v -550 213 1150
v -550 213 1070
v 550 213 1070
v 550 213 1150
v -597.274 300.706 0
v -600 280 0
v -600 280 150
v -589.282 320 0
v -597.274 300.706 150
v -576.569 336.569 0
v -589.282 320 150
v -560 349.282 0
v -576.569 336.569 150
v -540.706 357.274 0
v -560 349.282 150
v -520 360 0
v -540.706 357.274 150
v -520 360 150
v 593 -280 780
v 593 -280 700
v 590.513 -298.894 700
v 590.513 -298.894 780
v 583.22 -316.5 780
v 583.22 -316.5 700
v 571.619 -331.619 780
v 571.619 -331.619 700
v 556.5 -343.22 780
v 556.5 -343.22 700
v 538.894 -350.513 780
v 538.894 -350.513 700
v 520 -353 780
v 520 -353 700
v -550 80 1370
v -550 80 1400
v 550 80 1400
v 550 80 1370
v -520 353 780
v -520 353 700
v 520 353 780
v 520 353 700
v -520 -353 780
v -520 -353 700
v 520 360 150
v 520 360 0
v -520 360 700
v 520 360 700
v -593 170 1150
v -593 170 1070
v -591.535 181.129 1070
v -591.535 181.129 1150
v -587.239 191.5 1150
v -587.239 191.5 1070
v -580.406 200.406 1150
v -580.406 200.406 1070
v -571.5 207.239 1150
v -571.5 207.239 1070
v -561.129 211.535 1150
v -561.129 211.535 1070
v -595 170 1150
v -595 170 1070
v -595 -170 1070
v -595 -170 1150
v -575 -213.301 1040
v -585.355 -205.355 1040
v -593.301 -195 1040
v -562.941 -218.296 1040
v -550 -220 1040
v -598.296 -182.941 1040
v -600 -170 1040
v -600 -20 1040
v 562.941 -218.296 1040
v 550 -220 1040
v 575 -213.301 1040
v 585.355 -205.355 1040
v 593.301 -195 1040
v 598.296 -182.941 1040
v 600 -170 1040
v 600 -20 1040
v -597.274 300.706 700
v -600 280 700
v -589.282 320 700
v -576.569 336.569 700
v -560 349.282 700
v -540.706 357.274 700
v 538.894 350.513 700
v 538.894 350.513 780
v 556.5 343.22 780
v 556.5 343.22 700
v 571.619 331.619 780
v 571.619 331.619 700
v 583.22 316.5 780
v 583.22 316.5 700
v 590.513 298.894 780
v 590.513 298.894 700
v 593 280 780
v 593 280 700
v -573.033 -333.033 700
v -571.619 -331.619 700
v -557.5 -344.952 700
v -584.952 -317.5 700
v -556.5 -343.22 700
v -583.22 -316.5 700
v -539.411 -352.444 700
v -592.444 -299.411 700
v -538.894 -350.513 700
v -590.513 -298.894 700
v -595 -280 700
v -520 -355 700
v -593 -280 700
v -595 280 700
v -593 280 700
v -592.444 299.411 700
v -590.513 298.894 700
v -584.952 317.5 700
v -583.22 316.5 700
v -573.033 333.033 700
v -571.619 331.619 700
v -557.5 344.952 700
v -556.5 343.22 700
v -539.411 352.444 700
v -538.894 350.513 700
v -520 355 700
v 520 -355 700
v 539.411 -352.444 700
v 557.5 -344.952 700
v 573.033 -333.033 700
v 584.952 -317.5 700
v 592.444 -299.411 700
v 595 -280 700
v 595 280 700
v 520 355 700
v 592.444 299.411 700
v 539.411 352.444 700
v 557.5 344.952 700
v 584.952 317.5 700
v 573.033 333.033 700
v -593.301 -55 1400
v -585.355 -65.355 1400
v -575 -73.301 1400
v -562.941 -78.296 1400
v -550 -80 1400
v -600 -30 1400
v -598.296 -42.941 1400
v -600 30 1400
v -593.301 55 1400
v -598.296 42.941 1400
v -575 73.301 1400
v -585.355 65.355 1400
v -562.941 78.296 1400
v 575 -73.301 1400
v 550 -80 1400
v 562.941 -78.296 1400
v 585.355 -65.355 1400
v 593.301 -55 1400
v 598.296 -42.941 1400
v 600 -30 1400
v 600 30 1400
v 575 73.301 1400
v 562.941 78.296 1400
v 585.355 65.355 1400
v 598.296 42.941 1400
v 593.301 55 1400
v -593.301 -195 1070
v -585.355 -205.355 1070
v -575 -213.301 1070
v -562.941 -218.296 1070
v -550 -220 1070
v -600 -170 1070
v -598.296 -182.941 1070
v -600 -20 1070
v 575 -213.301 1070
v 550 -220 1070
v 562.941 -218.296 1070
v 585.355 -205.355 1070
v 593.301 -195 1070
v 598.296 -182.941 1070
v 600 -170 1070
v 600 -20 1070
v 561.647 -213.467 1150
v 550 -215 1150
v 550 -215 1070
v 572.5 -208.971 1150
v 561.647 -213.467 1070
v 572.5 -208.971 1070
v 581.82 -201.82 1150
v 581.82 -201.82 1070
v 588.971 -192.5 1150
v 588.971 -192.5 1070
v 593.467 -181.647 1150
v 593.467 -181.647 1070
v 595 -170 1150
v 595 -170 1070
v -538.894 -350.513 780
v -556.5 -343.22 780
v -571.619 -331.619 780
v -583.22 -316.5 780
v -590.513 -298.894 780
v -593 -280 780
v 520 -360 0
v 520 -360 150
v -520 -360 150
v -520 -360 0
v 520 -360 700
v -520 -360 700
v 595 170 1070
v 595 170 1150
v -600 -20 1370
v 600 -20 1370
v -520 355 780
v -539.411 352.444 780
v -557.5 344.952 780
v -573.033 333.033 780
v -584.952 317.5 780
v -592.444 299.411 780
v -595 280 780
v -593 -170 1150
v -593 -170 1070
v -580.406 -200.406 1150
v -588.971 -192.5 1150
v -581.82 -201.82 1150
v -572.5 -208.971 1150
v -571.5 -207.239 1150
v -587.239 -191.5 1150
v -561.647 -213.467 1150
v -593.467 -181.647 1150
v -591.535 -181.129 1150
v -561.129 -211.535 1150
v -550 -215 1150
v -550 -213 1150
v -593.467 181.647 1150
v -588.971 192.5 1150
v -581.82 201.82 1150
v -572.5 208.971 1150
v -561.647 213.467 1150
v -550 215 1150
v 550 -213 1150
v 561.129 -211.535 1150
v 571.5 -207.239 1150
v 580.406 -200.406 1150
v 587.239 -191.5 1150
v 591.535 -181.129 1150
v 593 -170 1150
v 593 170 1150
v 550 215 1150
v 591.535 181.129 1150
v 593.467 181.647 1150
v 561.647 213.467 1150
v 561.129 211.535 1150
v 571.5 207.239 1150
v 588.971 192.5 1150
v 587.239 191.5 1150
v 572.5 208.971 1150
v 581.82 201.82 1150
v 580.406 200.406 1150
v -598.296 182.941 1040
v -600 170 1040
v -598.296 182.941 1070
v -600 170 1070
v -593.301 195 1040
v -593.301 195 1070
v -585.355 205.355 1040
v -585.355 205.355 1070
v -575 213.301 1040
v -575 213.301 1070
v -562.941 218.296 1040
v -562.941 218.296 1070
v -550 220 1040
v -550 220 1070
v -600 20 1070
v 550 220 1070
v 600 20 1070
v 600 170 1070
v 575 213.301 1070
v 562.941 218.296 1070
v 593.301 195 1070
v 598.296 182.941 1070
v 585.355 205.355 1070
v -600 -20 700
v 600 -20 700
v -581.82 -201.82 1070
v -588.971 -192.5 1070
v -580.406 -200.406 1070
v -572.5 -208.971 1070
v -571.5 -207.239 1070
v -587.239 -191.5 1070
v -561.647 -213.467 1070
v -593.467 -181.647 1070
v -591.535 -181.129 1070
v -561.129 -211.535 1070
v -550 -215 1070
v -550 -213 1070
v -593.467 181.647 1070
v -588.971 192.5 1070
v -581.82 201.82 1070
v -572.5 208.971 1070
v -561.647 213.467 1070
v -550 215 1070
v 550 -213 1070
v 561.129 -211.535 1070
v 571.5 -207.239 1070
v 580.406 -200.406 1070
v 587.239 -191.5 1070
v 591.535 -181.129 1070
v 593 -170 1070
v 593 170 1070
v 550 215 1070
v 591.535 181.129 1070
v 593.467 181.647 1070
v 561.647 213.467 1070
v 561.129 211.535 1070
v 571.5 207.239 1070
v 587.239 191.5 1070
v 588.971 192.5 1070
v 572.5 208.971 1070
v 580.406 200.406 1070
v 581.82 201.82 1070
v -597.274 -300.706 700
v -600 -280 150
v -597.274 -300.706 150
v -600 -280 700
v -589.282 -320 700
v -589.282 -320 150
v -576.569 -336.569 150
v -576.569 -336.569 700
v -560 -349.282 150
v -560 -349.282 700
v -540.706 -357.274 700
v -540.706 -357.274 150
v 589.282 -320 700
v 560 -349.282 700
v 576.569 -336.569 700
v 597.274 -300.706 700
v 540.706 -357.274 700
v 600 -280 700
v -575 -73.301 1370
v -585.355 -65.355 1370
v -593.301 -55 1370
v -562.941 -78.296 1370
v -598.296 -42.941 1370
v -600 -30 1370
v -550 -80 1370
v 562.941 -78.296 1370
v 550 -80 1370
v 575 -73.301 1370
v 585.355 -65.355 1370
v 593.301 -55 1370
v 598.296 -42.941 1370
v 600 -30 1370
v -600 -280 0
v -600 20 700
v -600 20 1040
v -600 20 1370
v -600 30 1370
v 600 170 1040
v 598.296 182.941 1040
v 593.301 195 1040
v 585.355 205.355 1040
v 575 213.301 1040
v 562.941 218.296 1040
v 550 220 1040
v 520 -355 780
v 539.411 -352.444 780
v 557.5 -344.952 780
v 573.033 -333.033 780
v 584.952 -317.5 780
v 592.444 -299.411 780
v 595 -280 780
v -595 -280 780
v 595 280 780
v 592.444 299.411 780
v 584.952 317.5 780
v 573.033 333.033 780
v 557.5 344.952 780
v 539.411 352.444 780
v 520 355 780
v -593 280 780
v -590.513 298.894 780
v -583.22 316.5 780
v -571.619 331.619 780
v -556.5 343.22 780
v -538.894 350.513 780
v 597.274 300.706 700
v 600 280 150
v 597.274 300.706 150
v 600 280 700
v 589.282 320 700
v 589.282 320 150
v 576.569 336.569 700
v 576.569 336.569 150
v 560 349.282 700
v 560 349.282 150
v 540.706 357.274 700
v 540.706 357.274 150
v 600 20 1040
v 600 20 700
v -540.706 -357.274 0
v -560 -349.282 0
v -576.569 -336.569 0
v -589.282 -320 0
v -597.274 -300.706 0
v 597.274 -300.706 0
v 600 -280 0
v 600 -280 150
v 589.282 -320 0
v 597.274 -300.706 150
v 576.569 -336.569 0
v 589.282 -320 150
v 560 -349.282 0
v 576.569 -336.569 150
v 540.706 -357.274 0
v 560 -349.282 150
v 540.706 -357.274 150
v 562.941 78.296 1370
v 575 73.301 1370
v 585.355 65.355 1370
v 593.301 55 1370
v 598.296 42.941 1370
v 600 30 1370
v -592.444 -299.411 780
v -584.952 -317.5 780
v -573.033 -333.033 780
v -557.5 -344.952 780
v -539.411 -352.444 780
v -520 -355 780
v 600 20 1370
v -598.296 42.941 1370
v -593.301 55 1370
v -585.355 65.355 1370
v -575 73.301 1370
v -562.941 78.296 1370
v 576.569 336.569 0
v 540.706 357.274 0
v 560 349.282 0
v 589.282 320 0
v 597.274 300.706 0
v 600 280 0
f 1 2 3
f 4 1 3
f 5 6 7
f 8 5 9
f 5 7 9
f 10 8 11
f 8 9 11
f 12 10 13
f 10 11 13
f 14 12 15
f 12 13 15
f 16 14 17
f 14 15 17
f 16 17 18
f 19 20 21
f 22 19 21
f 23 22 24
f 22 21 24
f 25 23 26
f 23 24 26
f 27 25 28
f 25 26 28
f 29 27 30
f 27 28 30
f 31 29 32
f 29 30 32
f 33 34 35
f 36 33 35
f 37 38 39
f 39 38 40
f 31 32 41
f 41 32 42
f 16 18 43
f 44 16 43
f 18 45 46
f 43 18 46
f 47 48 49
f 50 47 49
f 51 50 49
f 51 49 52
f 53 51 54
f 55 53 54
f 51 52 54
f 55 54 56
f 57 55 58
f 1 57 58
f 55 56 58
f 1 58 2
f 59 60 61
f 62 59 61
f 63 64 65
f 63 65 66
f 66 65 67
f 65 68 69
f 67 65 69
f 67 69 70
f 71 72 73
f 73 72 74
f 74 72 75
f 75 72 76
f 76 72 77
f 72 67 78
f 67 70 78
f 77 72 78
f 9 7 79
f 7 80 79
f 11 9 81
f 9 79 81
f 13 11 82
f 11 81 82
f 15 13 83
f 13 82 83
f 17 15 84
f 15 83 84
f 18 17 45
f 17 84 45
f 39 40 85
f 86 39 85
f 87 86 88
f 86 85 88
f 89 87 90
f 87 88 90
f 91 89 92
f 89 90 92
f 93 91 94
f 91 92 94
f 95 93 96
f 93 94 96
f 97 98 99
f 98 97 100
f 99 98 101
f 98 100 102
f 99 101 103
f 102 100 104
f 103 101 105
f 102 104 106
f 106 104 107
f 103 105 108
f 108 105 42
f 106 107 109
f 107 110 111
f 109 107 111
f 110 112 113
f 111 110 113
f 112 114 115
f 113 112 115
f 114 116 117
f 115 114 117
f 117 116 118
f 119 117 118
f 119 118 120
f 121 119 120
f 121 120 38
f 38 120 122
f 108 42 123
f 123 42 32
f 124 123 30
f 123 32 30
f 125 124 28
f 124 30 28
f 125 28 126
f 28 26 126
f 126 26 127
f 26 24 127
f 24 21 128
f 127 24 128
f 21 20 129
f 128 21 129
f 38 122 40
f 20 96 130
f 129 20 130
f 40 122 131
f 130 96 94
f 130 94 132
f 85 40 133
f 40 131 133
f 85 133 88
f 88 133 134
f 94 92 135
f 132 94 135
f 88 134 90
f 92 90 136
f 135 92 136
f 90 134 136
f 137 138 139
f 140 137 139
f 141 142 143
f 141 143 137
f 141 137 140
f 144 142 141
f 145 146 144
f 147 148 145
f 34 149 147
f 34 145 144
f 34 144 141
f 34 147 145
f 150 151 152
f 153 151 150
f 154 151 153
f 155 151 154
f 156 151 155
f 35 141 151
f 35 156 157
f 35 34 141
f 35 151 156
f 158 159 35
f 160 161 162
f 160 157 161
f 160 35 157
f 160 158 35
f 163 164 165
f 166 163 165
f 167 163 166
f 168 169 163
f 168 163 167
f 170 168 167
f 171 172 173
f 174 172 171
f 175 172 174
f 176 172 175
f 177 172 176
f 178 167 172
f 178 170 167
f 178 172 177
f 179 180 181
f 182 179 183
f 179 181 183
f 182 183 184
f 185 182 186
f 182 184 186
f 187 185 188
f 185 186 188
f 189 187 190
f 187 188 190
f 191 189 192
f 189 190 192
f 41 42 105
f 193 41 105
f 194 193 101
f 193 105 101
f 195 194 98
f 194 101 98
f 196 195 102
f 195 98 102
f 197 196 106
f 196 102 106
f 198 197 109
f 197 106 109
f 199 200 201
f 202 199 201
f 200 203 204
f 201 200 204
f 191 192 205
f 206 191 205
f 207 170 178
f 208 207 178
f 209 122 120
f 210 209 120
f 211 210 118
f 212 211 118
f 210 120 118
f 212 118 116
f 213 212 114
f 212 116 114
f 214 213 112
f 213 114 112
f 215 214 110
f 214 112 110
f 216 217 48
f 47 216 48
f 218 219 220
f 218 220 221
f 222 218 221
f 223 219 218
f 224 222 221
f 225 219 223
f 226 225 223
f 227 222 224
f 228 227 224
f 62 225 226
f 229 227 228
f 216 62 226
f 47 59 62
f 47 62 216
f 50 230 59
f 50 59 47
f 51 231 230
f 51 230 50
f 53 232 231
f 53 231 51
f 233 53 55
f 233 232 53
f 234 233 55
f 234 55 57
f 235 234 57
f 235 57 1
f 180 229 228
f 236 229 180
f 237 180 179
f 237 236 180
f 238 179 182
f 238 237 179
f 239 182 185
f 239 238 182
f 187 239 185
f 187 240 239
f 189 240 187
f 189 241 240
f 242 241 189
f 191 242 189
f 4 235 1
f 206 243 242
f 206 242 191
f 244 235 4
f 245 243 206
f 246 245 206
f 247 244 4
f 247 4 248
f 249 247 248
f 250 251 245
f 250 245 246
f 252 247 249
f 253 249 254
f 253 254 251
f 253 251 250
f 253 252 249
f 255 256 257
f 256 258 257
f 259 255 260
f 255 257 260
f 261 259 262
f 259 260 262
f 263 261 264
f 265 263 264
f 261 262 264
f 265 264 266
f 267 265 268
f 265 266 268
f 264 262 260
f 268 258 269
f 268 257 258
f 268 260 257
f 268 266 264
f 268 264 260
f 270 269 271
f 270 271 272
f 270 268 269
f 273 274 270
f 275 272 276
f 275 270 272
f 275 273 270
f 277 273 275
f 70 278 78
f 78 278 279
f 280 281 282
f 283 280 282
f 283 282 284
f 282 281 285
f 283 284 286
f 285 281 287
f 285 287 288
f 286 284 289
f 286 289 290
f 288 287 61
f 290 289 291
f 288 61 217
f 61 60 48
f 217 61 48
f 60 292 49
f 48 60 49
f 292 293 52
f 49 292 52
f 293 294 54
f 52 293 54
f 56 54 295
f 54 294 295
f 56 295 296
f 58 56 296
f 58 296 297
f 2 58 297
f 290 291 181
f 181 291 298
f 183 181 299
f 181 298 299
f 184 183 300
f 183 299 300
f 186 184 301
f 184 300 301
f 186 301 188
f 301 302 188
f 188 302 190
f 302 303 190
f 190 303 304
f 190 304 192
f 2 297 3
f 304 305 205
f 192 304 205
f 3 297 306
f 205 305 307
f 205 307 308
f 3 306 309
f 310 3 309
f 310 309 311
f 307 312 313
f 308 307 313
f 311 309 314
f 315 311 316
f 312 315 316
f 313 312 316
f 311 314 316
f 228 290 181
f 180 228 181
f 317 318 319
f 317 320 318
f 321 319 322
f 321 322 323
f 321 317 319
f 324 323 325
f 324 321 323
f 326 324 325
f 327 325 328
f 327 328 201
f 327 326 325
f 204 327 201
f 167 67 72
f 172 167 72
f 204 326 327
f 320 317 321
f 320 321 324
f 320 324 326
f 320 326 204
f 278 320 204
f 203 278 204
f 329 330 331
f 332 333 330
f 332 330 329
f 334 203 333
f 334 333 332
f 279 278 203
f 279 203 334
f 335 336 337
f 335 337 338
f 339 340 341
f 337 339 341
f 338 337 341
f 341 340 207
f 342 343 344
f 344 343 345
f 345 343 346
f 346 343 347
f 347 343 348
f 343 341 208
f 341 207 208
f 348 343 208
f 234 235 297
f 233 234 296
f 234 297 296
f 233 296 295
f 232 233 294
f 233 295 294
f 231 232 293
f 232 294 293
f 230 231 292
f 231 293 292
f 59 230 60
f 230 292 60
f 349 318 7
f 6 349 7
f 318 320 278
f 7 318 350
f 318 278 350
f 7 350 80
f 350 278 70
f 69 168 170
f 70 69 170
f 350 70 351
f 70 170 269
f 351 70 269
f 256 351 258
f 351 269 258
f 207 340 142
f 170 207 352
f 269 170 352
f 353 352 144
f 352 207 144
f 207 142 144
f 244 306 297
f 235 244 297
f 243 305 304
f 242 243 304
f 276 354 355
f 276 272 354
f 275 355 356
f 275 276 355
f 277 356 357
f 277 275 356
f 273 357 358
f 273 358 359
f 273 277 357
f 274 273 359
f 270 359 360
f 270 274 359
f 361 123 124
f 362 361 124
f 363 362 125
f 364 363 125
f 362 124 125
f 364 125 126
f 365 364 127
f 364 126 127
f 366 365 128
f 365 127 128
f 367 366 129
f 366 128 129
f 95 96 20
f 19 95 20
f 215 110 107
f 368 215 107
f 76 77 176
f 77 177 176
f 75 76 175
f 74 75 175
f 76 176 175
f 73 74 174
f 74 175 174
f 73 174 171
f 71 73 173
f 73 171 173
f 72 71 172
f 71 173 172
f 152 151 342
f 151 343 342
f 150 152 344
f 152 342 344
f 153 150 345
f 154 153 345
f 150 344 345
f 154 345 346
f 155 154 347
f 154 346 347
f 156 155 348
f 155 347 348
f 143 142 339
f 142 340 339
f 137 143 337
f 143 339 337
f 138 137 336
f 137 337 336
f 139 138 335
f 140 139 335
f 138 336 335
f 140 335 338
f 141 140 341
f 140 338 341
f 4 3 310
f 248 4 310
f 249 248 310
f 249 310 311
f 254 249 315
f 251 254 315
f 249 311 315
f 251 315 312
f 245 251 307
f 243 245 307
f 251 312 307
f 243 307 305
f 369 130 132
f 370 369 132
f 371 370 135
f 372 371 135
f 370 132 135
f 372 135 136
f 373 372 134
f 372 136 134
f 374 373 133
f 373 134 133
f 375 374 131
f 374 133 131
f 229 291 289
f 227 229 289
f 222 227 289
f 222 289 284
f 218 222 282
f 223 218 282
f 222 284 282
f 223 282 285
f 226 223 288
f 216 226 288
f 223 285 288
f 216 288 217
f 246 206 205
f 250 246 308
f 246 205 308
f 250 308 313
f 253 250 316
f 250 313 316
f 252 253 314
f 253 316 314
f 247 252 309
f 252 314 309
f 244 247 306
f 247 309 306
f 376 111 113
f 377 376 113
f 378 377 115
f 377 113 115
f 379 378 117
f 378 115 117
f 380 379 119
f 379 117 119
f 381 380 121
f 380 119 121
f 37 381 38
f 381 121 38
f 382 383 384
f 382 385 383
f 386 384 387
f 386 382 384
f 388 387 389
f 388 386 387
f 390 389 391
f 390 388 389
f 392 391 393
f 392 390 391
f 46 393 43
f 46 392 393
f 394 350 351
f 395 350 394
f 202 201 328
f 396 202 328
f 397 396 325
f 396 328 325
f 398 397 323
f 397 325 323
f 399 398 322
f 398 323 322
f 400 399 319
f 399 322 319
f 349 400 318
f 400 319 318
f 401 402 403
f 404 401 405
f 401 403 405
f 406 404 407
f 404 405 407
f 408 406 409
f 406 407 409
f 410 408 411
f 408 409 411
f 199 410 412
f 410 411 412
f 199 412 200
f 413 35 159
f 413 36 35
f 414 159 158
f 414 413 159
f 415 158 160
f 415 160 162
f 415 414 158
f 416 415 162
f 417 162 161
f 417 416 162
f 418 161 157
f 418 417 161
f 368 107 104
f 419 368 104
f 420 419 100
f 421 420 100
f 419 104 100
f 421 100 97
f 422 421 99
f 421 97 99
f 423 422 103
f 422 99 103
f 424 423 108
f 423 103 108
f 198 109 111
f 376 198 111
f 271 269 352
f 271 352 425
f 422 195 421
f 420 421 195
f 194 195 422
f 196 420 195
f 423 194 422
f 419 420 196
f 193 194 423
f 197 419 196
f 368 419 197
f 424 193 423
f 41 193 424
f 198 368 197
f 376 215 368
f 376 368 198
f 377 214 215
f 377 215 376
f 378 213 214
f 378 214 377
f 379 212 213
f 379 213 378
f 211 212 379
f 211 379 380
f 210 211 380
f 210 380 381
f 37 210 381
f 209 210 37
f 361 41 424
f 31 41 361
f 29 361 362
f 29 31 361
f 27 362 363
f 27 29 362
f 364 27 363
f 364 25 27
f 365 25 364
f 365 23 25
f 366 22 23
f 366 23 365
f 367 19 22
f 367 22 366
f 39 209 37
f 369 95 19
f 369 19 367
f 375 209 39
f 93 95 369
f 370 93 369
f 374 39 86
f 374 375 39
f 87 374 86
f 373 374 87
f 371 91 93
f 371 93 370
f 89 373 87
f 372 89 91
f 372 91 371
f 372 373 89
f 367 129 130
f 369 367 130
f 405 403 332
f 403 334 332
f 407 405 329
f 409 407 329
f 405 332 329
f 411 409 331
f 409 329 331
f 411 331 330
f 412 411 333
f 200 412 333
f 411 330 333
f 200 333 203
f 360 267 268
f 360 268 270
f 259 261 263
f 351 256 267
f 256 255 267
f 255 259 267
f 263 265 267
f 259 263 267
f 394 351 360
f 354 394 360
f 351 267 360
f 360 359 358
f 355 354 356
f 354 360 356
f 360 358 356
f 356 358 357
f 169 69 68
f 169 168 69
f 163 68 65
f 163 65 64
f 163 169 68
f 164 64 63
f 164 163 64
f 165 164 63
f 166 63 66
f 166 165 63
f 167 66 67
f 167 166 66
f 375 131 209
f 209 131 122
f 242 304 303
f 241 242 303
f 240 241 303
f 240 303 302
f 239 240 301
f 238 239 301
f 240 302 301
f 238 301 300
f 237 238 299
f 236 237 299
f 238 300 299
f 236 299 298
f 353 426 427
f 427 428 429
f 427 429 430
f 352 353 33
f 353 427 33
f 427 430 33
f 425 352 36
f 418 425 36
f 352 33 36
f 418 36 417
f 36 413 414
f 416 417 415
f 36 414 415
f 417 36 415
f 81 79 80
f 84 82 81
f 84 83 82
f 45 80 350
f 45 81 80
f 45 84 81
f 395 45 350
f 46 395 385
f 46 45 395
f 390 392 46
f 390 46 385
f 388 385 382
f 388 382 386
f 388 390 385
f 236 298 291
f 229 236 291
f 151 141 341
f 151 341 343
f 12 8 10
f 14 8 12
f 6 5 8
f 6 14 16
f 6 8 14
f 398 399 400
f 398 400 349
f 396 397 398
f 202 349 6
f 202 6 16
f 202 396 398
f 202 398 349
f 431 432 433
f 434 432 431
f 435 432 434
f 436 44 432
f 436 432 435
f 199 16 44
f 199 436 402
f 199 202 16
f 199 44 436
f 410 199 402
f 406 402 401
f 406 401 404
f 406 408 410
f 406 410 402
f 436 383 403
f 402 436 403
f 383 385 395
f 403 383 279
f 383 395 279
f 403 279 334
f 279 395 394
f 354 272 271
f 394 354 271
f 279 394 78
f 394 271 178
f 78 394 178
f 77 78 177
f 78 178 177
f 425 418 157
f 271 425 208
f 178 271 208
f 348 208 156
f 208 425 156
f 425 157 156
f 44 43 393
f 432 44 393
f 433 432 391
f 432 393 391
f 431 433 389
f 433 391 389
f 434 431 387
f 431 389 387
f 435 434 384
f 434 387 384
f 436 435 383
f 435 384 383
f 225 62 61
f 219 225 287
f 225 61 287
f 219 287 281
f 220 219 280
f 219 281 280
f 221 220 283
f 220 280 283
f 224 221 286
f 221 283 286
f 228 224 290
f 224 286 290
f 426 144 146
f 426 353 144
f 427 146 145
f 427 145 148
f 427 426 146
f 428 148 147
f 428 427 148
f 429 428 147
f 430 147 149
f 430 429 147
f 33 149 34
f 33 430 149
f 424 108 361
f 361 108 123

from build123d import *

# Parameters (mm, degrees)
F2_W      = 1100
F2_H      = 620
F3_DEPTH  = 150
F4_W      = 1200
F4_H      = 720
F5_DEPTH  = 550
F6_W      = 1200
F6_H      = 40
F7_DEPTH  = 700
F9_W      = 1200
F9_H      = 440
F10_DEPTH = 30
F11_W     = 1200
F11_H     = 160
F12_DEPTH = 30
F13_R     = 80
F14_R     = 85
F15_R     = 50
F16_R     = 50
F18_DEPTH = 80
F20_DEPTH = 80
F23_DEPTH = 1200
F25_DEPTH = 5
F27_DEPTH = 5
F29_DEPTH = 5
F31_DEPTH = 5
F32_R     = 15
F33_DEPTH = 594.9519681096
F35_DEPTH = 150


with BuildPart() as f3:
    # F2 (on Top) → F3 (new body, through all)
    with BuildSketch(Plane.XY):
        Rectangle(F2_W, F2_H)
    extrude(amount=F3_DEPTH)

    # F4 (on face) → F5 (join, through all)
    with BuildSketch(Plane.XY.offset(150)):
        Rectangle(F4_W, F4_H)
    extrude(amount=F5_DEPTH)

    # F6 (on face) → F7 (join, through all)
    with BuildSketch(Plane.XY.offset(700)):
        Rectangle(F6_W, F6_H)
    extrude(amount=F7_DEPTH)

    # F9 (on plane+point) → F10 (join, through all)
    with BuildSketch(Plane.XY.offset(1040)):
        Rectangle(F9_W, F9_H)
    extrude(amount=F10_DEPTH)

    # F11 (on face) → F12 (join, through all)
    with BuildSketch(Plane.XY.offset(1400)):
        Rectangle(F11_W, F11_H)
    extrude(amount=-F12_DEPTH)

    # F13
    f13_edges = [f3.edges().sort_by_distance(p)[0] for p in [
        (600, -360, 425),
        (-600, -360, 425),
        (600, 360, 425),
        (-600, 360, 425),
    ]]
    fillet(f13_edges, radius=F13_R)

    # F14
    f14_edges = [f3.edges().sort_by_distance(p)[0] for p in [
        (-550, 310, 75),
        (-550, -310, 75),
        (550, -310, 75),
        (550, 310, 75),
    ]]
    fillet(f14_edges, radius=F14_R)

    # F15
    f15_edges = [f3.edges().sort_by_distance(p)[0] for p in [
        (600, 220, 1055),
        (-600, 220, 1055),
        (-600, -220, 1055),
        (600, -220, 1055),
    ]]
    fillet(f15_edges, radius=F15_R)

    # F16
    f16_edges = [f3.edges().sort_by_distance(p)[0] for p in [
        (600, -80, 1385),
        (600, 80, 1385),
        (-600, -80, 1385),
        (-600, 80, 1385),
    ]]
    fillet(f16_edges, radius=F16_R)

    # F34 (on face) → F35 (join, through all)
    with BuildSketch(Plane(origin=(0, 0, 150), x_dir=(1, 0, 0), z_dir=(0, 0, -1))):
        with BuildLine():
            Line((520, 360), (-520, 360))
            ThreePointArc((-520, 360), (-576.5685424949, 336.5685424949), (-600, 280))
            Line((-600, 280), (-600, -280))
            ThreePointArc((-600, -280), (-576.5685424949, -336.5685424949), (-520, -360))
            Line((-520, -360), (520, -360))
            ThreePointArc((520, -360), (576.5685424949, -336.5685424949), (600, -280))
            Line((600, -280), (600, 280))
            ThreePointArc((600, 280), (576.5685424949, 336.5685424949), (520, 360))
        make_face()
    extrude(amount=F35_DEPTH)


with BuildPart() as f18:
    # F17 (on face) → F18 (new body)
    with BuildSketch(Plane.XY.offset(700)):
        with BuildLine():
            ThreePointArc((-520, 355), (-573.033008589, 333.033008589), (-595, 280))
            Line((-595, 280), (-595, -280))
            ThreePointArc((-595, -280), (-573.033008589, -333.033008589), (-520, -355))
            Line((-520, -355), (520, -355))
            ThreePointArc((520, -355), (573.033008589, -333.033008589), (595, -280))
            Line((595, -280), (595, 280))
            ThreePointArc((595, 280), (573.033008589, 333.033008589), (520, 355))
            Line((520, 355), (-520, 355))
        make_face()
        with BuildLine():
            ThreePointArc((593, -280), (571.6187950266, -331.6187950266), (520, -353))
            Line((520, -353), (-520, -353))
            ThreePointArc((-520, -353), (-571.6187950266, -331.6187950266), (-593, -280))
            Line((-593, -280), (-593, 280))
            ThreePointArc((-593, 280), (-571.6187950266, 331.6187950266), (-520, 353))
            Line((-520, 353), (520, 353))
            ThreePointArc((520, 353), (571.6187950266, 331.6187950266), (593, 280))
            Line((593, 280), (593, -280))
        make_face(mode=Mode.SUBTRACT)
    extrude(amount=F18_DEPTH)


with BuildPart() as f20:
    # F19 (on face) → F20 (new body)
    with BuildSketch(Plane.XY.offset(1070)):
        with BuildLine():
            ThreePointArc((-550, 215), (-581.8198051534, 201.8198051534), (-595, 170))
            Line((-595, 170), (-595, 15))
            Line((-595, 15), (-595, -15))
            Line((-595, -15), (-595, -170))
            ThreePointArc((-595, -170), (-581.8198051534, -201.8198051534), (-550, -215))
            Line((-550, -215), (550, -215))
            ThreePointArc((550, -215), (581.8198051534, -201.8198051534), (595, -170))
            Line((595, -170), (595, -15))
            Line((595, -15), (595, 15))
            Line((595, 15), (595, 170))
            ThreePointArc((595, 170), (581.8198051534, 201.8198051534), (550, 215))
            Line((550, 215), (-550, 215))
        make_face()
        with BuildLine():
            Line((593, 170), (593, 15))
            Line((593, 15), (593, -15))
            Line((593, -15), (593, -170))
            ThreePointArc((593, -170), (580.405591591, -200.405591591), (550, -213))
            Line((550, -213), (-550, -213))
            ThreePointArc((-550, -213), (-580.405591591, -200.405591591), (-593, -170))
            Line((-593, -170), (-593, -15))
            Line((-593, -15), (-593, 15))
            Line((-593, 15), (-593, 170))
            ThreePointArc((-593, 170), (-580.405591591, 200.405591591), (-550, 213))
            Line((-550, 213), (550, 213))
            ThreePointArc((550, 213), (580.405591591, 200.405591591), (593, 170))
        make_face(mode=Mode.SUBTRACT)
    extrude(amount=F20_DEPTH)


with BuildPart() as f23:
    # F22 (on face) → F23 (new body, through all)
    with BuildSketch(Plane.YZ.offset(600)):
        Polygon((360, 1950), (0, 2000), (-360, 1950), (-359.2928826924, 1945.0501788468), (0, 1994.9519681096), (359.2928826924, 1945.0501788468), align=None)
    extrude(amount=-F23_DEPTH)

    # F24 (on face) → F25 (join)
    with BuildSketch(Plane.XZ.offset(360)):
        with BuildLine():
            Line((600, 1950), (-600, 1950))
            Line((-600, 1950), (-600, 1860))
            ThreePointArc((-600, 1860), (-540, 1800), (-480, 1860))
            ThreePointArc((-480, 1860), (-420, 1800), (-360, 1860))
            ThreePointArc((-360, 1860), (-300, 1800), (-240, 1860))
            ThreePointArc((-240, 1860), (-180, 1800), (-120, 1860))
            ThreePointArc((-120, 1860), (-60, 1800), (0, 1860))
            ThreePointArc((0, 1860), (60, 1800), (120, 1860))
            ThreePointArc((120, 1860), (180, 1800), (240, 1860))
            ThreePointArc((240, 1860), (300, 1800), (360, 1860))
            ThreePointArc((360, 1860), (420, 1800), (480, 1860))
            ThreePointArc((480, 1860), (540, 1800), (600, 1860))
            Line((600, 1860), (600, 1950))
        make_face()
    extrude(amount=-F25_DEPTH)

    # F26 (on face) → F27 (join)
    with BuildSketch(Plane(origin=(0, 360, 0), x_dir=(-1, 0, 0), z_dir=(0, 1, 0))):
        with BuildLine():
            Line((600, 1860), (600, 1950))
            Line((600, 1950), (-600, 1950))
            Line((-600, 1950), (-600, 1860))
            ThreePointArc((-600, 1860), (-540, 1800), (-480, 1860))
            ThreePointArc((-480, 1860), (-420, 1800), (-360, 1860))
            ThreePointArc((-360, 1860), (-300, 1800), (-240, 1860))
            ThreePointArc((-240, 1860), (-180, 1800), (-120, 1860))
            ThreePointArc((-120, 1860), (-60, 1800), (0, 1860))
            ThreePointArc((0, 1860), (60, 1800), (120, 1860))
            ThreePointArc((120, 1860), (180, 1800), (240, 1860))
            ThreePointArc((240, 1860), (300, 1800), (360, 1860))
            ThreePointArc((360, 1860), (420, 1800), (480, 1860))
            ThreePointArc((480, 1860), (540, 1800), (600, 1860))
        make_face()
    extrude(amount=-F27_DEPTH)

    # F28 (on face) → F29 (join)
    with BuildSketch(Plane.YZ.offset(600)):
        with BuildLine():
            Line((360, 1950), (0, 2000))
            Line((0, 2000), (-360, 1950))
            Line((-360, 1950), (-360, 1860))
            ThreePointArc((-360, 1860), (-300, 1800), (-240, 1860))
            ThreePointArc((-240, 1860), (-180, 1800), (-120, 1860))
            ThreePointArc((-120, 1860), (-60, 1800), (0, 1860))
            ThreePointArc((0, 1860), (60, 1800), (120, 1860))
            ThreePointArc((120, 1860), (180, 1800), (240, 1860))
            ThreePointArc((240, 1860), (300, 1800), (360, 1860))
            Line((360, 1860), (360, 1950))
        make_face()
    extrude(amount=-F29_DEPTH)

    # F30 (on face) → F31 (join)
    with BuildSketch(Plane(origin=(-600, 0, 0), x_dir=(0, -1, 0), z_dir=(-1, 0, 0))):
        with BuildLine():
            Line((-360, 1950), (-360, 1860))
            ThreePointArc((-360, 1860), (-300, 1800), (-240, 1860))
            ThreePointArc((-240, 1860), (-180, 1800), (-120, 1860))
            ThreePointArc((-120, 1860), (-60, 1800), (0, 1860))
            ThreePointArc((0, 1860), (60, 1800), (120, 1860))
            ThreePointArc((120, 1860), (180, 1800), (240, 1860))
            ThreePointArc((240, 1860), (300, 1800), (360, 1860))
            Line((360, 1860), (360, 1950))
            Line((360, 1950), (0, 2000))
            Line((0, 2000), (-360, 1950))
        make_face()
    extrude(amount=-F31_DEPTH)


with BuildPart() as f33:
    # F32 (on face) → F33 (new body, through all)
    with BuildSketch(Plane.XY.offset(1400)):
        with Locations((-520, 0)):
            Circle(F32_R)
    extrude(amount=F33_DEPTH)


with BuildPart() as f33b:
    # F32 (on face) → F33, piece 2 (new body, through all)
    with BuildSketch(Plane.XY.offset(1400)):
        with Locations((520, 0)):
            Circle(F32_R)
    extrude(amount=F33_DEPTH)


solid = Compound([f3.part, f18.part, f20.part])
